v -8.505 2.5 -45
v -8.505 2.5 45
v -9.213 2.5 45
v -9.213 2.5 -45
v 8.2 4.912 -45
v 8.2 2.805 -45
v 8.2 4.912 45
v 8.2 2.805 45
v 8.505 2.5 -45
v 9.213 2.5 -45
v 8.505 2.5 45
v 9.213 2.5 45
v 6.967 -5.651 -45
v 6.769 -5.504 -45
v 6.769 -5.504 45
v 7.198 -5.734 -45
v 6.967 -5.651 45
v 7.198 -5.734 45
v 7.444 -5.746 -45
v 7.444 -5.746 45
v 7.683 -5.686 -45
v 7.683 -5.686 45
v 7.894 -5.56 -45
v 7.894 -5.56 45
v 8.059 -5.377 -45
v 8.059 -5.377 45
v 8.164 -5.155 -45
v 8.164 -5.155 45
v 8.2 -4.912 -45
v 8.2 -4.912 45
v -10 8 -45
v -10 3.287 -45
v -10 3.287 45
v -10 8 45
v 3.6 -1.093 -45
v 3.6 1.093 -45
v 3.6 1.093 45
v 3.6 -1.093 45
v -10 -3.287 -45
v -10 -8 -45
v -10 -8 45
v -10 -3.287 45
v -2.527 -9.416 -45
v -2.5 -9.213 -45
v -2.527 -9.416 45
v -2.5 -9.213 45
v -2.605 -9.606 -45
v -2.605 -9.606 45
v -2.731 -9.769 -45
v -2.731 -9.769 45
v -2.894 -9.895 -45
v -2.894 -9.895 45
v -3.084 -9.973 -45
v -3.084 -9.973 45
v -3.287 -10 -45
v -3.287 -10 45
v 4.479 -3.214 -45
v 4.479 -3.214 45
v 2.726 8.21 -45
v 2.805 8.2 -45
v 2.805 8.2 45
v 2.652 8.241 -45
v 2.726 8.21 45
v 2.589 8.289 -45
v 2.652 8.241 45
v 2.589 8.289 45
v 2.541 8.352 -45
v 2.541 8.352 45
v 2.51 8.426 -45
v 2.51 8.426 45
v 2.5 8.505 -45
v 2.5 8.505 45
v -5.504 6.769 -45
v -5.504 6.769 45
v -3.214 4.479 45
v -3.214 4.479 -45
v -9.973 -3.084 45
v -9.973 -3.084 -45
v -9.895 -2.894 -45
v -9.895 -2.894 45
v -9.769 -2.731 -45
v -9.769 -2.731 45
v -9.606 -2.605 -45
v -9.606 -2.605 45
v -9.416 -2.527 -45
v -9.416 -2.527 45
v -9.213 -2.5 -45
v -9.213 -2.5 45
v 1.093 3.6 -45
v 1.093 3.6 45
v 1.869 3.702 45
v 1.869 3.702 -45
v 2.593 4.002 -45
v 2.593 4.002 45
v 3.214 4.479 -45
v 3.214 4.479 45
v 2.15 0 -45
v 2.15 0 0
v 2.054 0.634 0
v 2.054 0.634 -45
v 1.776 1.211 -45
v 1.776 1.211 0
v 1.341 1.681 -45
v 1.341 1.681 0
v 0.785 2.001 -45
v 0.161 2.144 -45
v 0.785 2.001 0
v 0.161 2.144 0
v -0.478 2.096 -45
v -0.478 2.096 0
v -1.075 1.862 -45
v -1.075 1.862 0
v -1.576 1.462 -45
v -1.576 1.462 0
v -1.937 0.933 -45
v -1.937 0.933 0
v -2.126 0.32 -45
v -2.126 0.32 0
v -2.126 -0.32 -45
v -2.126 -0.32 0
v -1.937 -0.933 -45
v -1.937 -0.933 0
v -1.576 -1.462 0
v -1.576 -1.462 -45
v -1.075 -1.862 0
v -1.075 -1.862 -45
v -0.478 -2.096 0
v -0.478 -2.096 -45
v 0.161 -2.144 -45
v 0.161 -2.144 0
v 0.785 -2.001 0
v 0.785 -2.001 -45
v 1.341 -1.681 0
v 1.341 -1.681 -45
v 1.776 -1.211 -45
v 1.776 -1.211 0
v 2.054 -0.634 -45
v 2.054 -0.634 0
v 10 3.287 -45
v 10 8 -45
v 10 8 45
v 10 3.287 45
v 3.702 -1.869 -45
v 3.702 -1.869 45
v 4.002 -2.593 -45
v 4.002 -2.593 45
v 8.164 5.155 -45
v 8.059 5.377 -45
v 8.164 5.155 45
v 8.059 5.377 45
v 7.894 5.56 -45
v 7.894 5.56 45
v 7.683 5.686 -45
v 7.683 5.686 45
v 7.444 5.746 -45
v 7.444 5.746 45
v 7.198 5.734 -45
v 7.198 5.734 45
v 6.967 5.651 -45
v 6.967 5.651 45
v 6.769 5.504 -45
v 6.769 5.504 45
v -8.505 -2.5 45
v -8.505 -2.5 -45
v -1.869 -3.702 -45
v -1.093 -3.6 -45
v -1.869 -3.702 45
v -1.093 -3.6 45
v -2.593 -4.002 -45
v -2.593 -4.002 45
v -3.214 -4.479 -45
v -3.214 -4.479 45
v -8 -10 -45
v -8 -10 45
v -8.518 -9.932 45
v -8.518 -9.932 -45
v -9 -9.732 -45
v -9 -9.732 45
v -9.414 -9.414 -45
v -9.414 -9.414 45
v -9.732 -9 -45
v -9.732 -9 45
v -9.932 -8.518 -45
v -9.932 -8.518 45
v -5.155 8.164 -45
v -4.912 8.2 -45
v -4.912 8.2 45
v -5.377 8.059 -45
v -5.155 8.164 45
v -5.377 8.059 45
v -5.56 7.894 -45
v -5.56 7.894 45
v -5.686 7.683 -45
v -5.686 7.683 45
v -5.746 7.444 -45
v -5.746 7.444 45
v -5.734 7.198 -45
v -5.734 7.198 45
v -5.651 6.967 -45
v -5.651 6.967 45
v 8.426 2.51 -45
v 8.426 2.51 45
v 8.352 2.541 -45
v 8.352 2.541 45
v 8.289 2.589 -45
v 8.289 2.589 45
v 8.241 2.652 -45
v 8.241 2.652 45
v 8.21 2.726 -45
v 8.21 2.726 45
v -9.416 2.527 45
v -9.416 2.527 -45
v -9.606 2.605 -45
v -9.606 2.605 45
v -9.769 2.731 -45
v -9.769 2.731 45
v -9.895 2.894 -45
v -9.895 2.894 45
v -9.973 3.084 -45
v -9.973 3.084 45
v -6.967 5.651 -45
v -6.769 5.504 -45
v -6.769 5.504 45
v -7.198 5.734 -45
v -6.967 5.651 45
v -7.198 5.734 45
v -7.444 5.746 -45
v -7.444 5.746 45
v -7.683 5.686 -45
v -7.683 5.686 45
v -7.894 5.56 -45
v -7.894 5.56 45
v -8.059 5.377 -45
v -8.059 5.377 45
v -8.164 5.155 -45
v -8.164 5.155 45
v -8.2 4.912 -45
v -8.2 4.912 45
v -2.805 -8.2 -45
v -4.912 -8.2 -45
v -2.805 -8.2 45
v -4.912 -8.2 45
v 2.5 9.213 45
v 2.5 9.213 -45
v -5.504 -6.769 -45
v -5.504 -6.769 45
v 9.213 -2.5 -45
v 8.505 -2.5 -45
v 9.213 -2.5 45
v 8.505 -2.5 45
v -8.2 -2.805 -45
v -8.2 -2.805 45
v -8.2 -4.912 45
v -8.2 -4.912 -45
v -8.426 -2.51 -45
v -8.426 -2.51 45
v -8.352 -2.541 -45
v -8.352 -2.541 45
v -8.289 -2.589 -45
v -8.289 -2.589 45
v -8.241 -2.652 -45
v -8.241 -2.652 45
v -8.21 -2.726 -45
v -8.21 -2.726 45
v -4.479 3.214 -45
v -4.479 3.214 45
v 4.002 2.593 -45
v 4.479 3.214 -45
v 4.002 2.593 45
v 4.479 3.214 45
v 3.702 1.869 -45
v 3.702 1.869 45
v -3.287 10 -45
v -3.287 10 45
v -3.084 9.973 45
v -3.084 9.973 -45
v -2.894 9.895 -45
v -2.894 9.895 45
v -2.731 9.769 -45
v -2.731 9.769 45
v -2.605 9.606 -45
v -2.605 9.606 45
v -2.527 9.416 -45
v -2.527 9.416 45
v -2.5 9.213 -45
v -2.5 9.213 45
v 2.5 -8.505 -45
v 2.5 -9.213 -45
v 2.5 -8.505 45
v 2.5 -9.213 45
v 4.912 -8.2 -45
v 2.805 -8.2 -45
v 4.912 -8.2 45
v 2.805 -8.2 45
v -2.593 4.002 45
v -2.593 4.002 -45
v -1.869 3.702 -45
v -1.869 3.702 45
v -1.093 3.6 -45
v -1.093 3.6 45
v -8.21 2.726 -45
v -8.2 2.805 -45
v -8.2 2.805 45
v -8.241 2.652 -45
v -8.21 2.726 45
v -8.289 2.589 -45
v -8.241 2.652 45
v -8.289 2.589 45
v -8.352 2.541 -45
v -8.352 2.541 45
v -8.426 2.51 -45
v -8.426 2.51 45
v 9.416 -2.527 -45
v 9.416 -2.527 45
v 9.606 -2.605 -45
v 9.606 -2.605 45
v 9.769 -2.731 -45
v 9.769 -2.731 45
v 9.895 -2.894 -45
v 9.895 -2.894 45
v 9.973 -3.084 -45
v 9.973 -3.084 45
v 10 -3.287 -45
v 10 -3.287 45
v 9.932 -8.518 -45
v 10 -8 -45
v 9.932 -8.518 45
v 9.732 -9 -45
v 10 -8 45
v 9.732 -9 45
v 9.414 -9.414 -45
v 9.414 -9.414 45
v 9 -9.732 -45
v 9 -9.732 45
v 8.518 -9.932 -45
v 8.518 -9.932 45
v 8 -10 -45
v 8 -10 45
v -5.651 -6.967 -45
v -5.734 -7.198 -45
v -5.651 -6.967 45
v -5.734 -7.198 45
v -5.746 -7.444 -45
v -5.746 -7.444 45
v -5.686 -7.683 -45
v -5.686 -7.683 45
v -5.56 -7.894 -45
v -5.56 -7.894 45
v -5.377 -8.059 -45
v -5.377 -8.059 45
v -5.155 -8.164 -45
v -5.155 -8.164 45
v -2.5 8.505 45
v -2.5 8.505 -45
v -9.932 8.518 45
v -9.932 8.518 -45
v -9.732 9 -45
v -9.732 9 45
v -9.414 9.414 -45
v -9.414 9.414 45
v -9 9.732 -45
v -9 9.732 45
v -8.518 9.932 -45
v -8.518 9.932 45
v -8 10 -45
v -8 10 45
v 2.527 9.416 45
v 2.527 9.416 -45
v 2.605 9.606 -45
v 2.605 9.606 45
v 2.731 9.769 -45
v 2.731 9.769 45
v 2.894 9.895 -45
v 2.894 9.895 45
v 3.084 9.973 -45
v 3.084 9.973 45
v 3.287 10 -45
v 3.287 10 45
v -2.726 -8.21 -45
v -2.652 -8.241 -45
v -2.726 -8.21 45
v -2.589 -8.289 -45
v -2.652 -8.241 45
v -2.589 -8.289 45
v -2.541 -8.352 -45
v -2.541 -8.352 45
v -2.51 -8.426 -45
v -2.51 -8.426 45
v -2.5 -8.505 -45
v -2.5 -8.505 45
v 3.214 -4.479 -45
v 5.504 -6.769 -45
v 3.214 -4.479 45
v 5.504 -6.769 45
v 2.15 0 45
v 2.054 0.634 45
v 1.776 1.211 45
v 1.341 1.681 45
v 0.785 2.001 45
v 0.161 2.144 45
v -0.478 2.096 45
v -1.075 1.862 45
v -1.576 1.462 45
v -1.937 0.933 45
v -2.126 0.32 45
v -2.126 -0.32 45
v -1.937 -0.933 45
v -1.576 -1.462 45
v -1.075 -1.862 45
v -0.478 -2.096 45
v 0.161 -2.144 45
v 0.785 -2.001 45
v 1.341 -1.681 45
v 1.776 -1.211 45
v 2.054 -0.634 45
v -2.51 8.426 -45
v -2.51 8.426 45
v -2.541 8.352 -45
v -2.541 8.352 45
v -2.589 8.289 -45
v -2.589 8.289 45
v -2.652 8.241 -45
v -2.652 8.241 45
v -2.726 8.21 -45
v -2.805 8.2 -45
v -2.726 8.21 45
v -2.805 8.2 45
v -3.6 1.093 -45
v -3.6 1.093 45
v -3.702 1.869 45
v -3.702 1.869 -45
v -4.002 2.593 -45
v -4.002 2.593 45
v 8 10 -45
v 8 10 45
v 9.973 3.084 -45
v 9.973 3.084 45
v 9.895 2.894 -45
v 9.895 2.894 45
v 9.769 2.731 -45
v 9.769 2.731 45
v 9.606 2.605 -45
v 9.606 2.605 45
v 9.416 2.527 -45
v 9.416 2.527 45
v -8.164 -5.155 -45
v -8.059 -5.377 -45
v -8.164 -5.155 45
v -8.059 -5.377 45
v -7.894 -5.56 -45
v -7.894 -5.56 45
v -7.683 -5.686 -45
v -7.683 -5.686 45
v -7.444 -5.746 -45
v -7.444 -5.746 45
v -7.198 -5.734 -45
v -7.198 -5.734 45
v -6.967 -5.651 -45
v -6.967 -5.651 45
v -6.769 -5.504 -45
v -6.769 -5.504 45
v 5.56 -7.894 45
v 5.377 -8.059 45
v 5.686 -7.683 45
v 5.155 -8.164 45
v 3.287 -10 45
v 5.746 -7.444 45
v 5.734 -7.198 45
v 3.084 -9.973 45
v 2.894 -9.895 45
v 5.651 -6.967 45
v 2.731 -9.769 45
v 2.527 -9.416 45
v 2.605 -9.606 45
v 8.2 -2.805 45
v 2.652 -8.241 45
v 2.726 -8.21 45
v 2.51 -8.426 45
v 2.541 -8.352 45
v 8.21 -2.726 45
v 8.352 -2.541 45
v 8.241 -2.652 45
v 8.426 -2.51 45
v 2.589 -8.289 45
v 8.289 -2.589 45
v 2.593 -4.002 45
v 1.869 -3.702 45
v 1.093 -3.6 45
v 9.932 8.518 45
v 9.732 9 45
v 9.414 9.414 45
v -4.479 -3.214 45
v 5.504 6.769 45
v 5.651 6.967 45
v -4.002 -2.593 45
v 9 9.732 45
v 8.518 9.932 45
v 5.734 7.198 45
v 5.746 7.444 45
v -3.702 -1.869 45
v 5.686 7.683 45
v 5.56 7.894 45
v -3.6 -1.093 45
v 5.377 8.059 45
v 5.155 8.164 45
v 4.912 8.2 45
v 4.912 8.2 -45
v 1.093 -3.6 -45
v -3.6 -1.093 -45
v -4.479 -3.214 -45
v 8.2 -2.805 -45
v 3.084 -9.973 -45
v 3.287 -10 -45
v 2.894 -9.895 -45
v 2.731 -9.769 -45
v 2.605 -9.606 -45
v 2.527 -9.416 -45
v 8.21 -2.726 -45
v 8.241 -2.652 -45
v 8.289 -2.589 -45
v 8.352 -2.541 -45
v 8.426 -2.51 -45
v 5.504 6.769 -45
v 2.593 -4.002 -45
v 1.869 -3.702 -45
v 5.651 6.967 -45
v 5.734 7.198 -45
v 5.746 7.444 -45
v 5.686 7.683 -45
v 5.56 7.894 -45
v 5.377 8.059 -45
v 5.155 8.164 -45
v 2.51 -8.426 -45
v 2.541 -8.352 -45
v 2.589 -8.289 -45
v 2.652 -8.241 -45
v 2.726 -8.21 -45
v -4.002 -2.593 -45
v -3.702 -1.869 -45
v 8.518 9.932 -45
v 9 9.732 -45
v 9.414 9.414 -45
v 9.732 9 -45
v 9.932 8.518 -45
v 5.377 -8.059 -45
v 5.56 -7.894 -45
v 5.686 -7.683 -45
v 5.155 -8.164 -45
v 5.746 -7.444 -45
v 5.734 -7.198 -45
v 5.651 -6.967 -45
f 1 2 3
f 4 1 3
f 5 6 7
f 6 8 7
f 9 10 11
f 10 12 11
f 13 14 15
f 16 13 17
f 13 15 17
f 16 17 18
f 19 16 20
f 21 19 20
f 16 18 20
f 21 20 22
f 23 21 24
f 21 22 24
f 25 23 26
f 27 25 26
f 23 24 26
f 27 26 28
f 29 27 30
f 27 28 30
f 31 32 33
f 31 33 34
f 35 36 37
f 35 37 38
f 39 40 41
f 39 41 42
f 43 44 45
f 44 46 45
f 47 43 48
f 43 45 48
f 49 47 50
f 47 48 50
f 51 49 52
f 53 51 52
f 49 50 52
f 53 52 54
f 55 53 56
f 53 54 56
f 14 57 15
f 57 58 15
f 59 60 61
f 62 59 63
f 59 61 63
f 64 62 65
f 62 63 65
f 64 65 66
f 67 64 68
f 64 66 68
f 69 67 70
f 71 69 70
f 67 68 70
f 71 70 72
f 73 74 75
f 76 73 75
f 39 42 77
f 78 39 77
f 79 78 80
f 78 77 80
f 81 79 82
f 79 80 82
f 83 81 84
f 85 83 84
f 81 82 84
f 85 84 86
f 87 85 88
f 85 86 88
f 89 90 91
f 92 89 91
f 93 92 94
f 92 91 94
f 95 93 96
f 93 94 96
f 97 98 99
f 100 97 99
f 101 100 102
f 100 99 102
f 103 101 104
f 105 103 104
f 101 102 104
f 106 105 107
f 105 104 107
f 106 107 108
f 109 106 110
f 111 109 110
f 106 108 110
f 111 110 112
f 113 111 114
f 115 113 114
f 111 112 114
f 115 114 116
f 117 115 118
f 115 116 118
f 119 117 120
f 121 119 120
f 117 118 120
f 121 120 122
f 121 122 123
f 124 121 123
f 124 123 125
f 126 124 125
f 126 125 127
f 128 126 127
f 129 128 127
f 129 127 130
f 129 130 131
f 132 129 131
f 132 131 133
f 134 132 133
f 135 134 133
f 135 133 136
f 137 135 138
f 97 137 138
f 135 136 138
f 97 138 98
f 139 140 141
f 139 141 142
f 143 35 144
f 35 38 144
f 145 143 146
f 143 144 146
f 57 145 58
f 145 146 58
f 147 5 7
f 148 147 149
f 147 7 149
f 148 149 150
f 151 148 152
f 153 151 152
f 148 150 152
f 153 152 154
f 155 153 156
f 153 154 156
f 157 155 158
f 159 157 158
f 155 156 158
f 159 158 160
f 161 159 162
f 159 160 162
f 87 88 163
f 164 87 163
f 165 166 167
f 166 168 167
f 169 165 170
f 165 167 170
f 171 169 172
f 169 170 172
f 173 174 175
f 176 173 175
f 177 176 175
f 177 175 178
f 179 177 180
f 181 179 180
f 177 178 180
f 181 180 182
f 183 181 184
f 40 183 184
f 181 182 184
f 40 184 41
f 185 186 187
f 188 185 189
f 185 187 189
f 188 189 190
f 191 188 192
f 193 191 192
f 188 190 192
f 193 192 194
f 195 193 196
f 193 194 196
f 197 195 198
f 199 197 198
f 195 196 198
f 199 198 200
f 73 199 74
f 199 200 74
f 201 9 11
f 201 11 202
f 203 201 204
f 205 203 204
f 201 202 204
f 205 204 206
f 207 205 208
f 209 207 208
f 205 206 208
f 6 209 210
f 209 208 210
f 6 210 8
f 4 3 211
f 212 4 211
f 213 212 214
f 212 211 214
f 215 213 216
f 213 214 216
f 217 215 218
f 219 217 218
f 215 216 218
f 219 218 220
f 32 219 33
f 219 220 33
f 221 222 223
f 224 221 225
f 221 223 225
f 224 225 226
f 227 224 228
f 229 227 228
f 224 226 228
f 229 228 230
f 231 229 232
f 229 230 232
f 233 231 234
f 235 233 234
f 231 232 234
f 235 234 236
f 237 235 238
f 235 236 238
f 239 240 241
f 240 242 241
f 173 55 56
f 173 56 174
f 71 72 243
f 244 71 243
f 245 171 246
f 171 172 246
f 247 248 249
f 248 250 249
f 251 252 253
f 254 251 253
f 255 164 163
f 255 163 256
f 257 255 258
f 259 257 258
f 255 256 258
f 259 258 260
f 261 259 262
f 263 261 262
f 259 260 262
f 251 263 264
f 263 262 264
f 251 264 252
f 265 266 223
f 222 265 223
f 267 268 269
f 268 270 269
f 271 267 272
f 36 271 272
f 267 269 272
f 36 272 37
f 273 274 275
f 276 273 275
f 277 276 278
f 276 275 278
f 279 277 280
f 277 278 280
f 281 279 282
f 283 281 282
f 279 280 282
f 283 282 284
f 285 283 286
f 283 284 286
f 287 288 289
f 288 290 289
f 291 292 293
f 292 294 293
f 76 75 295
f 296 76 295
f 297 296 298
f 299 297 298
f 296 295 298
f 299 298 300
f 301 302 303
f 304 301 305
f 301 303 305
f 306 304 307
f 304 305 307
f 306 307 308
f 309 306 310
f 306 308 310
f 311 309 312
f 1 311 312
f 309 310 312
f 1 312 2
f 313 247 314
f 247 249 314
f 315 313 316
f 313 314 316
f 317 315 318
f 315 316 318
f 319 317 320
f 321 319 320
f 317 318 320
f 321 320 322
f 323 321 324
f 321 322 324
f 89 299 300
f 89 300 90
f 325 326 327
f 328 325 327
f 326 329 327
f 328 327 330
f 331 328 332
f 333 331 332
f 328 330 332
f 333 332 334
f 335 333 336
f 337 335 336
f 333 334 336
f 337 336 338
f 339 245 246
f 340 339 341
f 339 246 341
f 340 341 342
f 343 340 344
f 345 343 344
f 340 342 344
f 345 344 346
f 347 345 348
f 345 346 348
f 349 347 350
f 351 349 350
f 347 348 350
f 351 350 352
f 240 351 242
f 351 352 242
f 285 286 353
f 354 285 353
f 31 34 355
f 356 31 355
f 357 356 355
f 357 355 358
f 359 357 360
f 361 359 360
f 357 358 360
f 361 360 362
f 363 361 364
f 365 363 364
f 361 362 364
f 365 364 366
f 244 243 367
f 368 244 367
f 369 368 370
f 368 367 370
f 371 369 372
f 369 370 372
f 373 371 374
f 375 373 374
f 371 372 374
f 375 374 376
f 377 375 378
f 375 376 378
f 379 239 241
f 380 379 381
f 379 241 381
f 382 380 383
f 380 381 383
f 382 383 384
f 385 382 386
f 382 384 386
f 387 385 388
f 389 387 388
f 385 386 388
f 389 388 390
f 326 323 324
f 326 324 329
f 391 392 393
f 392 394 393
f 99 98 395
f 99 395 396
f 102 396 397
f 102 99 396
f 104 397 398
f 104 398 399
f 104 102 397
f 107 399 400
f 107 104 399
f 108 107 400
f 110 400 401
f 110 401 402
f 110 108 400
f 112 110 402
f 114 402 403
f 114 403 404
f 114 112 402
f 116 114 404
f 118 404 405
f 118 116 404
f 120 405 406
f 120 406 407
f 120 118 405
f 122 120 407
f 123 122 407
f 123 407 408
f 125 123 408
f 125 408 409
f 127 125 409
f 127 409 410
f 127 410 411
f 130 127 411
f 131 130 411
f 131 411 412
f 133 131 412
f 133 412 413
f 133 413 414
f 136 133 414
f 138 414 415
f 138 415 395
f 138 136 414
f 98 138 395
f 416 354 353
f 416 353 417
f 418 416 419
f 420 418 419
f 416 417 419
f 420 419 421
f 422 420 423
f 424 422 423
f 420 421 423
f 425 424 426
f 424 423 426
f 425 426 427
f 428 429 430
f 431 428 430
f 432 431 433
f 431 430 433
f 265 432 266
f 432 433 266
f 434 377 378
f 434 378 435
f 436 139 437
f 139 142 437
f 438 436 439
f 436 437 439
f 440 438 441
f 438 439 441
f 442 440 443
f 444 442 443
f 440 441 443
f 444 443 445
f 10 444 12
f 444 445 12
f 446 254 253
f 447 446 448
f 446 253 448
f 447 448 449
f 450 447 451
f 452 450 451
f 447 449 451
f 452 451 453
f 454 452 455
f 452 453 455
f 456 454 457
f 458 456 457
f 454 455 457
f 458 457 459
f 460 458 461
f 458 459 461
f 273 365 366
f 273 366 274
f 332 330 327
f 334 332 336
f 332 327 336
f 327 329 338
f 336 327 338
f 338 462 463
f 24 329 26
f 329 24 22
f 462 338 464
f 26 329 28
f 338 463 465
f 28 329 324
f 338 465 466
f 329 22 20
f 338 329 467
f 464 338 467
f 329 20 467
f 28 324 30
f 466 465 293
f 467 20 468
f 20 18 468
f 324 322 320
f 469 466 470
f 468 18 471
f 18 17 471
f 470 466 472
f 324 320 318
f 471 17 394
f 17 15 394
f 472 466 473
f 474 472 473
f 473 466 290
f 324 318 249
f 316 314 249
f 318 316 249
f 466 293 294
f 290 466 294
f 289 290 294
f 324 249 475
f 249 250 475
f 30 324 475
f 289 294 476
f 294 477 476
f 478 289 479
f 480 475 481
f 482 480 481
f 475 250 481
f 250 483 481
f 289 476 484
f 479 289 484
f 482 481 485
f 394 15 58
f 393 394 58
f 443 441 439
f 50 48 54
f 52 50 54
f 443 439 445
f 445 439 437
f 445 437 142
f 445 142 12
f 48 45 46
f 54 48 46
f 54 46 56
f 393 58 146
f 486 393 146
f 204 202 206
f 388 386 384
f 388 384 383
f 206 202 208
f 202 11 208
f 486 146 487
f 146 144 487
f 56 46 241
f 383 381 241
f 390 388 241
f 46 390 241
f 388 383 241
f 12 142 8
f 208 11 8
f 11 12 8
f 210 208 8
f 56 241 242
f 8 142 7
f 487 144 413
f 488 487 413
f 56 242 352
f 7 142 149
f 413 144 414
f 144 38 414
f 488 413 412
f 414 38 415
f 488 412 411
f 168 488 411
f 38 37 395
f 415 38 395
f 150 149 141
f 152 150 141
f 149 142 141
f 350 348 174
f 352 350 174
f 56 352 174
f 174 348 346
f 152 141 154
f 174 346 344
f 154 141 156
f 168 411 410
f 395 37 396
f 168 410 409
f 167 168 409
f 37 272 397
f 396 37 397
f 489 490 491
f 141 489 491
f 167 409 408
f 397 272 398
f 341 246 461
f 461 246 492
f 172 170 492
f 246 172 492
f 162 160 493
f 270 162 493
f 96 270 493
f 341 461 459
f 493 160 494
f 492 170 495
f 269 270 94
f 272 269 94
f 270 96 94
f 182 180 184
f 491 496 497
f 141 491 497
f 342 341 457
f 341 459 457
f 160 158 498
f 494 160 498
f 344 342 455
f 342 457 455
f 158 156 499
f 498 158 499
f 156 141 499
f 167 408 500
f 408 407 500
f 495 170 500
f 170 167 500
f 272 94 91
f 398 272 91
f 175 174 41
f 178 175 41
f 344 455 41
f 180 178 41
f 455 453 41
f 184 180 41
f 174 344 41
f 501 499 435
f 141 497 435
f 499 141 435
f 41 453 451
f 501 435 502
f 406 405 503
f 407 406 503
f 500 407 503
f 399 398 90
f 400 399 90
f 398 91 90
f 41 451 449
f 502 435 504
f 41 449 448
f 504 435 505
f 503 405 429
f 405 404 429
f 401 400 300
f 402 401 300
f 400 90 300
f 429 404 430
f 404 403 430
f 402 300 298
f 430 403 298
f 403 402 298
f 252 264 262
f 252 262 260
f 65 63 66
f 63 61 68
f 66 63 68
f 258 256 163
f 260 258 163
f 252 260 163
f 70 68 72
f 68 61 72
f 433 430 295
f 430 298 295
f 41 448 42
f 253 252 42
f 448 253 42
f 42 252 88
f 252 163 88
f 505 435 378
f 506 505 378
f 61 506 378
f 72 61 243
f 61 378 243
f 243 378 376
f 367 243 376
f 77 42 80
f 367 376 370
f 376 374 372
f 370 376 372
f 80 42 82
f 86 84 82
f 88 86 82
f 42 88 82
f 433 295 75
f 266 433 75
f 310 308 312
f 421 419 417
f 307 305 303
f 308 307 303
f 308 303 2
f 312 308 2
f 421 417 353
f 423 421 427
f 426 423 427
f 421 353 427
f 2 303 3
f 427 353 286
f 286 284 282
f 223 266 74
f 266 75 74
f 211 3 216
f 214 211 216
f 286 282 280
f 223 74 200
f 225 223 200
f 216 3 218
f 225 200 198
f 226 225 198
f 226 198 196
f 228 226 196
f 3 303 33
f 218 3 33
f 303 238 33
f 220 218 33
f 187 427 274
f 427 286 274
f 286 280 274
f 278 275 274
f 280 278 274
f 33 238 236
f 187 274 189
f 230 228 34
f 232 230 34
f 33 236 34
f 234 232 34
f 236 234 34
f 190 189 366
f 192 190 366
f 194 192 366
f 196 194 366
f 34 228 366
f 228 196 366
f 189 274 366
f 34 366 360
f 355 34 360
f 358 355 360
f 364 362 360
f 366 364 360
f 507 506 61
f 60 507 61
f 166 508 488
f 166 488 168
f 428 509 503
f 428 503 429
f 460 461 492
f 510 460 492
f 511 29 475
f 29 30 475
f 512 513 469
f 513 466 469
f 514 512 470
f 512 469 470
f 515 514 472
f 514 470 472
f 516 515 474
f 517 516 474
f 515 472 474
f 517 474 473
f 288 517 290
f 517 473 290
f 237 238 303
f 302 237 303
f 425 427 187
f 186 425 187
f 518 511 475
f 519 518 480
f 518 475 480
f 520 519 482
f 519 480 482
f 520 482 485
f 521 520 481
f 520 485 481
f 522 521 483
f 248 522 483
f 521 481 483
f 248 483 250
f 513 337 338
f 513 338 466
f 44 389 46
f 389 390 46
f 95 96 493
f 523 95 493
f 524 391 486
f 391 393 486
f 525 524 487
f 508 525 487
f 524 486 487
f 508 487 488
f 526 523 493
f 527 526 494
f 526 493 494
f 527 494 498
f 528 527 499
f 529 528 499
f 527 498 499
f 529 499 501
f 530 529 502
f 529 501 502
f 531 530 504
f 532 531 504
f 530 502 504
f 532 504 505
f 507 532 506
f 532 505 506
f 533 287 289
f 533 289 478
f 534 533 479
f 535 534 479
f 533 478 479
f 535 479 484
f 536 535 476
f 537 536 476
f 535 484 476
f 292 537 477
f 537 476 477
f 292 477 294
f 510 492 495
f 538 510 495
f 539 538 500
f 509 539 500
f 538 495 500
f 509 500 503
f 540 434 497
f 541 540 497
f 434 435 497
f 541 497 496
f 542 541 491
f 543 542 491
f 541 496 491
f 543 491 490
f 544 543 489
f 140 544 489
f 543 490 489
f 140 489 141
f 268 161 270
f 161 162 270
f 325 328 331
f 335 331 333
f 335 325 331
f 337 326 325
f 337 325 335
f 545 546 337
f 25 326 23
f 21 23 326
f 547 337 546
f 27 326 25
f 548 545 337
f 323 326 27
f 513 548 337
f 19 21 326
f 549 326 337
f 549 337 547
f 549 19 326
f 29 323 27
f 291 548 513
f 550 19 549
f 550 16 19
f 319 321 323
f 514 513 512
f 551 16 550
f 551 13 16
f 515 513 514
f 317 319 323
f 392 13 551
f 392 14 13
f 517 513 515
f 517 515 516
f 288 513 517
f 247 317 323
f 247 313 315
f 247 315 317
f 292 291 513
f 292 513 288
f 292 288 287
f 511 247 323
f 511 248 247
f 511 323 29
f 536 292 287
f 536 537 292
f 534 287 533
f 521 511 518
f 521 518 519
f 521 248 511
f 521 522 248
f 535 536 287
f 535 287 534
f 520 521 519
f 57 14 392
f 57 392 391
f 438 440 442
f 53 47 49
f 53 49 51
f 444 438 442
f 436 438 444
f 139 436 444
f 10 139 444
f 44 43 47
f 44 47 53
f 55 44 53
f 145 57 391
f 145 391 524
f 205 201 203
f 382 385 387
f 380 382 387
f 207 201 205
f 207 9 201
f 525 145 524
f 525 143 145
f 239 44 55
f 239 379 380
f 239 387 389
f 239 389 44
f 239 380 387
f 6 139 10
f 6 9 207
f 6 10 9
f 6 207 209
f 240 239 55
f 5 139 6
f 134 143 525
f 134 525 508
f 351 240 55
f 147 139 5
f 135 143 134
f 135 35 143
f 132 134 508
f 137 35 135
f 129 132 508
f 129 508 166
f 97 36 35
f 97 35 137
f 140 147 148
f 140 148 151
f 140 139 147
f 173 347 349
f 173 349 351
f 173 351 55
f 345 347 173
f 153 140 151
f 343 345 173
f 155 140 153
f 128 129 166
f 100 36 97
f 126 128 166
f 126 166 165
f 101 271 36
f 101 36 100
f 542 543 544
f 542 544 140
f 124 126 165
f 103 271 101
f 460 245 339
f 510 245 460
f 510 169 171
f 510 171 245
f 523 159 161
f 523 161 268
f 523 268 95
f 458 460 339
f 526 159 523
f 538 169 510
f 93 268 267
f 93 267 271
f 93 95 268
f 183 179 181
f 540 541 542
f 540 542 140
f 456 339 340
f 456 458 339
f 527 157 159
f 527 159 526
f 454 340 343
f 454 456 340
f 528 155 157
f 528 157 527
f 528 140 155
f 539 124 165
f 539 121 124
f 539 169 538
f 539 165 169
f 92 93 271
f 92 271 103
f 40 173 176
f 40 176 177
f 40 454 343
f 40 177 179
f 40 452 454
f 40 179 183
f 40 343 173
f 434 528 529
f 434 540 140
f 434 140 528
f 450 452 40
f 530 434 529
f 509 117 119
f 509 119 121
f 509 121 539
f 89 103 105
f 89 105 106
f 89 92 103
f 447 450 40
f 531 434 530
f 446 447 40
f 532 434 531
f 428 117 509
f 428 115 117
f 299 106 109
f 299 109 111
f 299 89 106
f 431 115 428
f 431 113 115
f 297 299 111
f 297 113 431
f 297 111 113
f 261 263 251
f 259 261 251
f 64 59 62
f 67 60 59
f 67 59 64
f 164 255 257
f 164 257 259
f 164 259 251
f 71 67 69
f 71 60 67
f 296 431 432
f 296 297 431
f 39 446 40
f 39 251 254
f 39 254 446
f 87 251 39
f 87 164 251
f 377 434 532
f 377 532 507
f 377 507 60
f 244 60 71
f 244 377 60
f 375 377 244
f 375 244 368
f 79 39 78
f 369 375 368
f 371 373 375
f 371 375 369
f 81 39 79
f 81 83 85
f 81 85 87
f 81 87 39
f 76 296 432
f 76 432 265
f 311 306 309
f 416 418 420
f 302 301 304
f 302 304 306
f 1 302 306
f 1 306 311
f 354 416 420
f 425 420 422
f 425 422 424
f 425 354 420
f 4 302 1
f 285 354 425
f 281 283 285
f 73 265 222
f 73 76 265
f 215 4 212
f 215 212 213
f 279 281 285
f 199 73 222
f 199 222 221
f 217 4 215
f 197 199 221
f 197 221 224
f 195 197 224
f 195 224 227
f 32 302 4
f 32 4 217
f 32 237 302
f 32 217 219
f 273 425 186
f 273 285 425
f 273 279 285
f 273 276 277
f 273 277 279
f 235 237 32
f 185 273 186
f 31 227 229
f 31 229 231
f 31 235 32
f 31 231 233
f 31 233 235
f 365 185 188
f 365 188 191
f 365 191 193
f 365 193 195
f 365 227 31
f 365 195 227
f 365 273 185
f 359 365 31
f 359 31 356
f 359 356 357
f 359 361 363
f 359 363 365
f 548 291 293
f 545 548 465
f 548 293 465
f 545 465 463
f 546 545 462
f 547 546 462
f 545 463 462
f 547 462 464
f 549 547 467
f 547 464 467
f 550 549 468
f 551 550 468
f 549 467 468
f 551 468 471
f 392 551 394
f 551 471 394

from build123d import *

# Parameters (mm, degrees)
SKETCH3_R                = 2.15
BOSS_EXTRUDE1_DEPTH      = 45
BOSS_EXTRUDE1_DEPTH_BACK = 45


with BuildPart() as part:
    # Sketch3 → Boss-Extrude1 (new body, two sides)
    with BuildSketch(Plane.XY) as boss_extrude1_sk:
        with BuildLine():
            Line((3.2874, 10), (8, 10))
            ThreePointArc((8, 10), (9.414213562, 9.414213562), (10, 8))
            Line((10, 8), (10, 3.2874))
            ThreePointArc((10, 3.2874), (9.76937588, 2.73062412), (9.2126, 2.5))
            Line((9.2126, 2.5), (8.5048, 2.5))
            ThreePointArc((8.5048, 2.5), (8.289273853, 2.589273853), (8.2, 2.8048))
            Line((8.2, 2.8048), (8.2, 4.9118))
            ThreePointArc((8.2, 4.9118), (7.682565253, 5.686195824), (6.769103096, 5.504496904))
            Line((6.769103096, 5.504496904), (4.478679656, 3.214073464))
            ThreePointArc((4.478679656, 3.214073464), (3.828361402, 2.240803418), (3.6, 1.092753121))
            Line((3.6, 1.092753121), (3.6, -1.092753121))
            ThreePointArc((3.6, -1.092753121), (3.828361402, -2.240803418), (4.478679656, -3.214073464))
            Line((4.478679656, -3.214073464), (6.769103096, -5.504496904))
            ThreePointArc((6.769103096, -5.504496904), (7.682565253, -5.686195824), (8.2, -4.9118))
            Line((8.2, -4.9118), (8.2, -2.8048))
            ThreePointArc((8.2, -2.8048), (8.289273853, -2.589273853), (8.5048, -2.5))
            Line((8.5048, -2.5), (9.2126, -2.5))
            ThreePointArc((9.2126, -2.5), (9.76937588, -2.73062412), (10, -3.2874))
            Line((10, -3.2874), (10, -8))
            ThreePointArc((10, -8), (9.414213562, -9.414213562), (8, -10))
            Line((8, -10), (3.2874, -10))
            ThreePointArc((3.2874, -10), (2.73062412, -9.76937588), (2.5, -9.2126))
            Line((2.5, -9.2126), (2.5, -8.5048))
            ThreePointArc((2.5, -8.5048), (2.589273853, -8.289273853), (2.8048, -8.2))
            Line((2.8048, -8.2), (4.9118, -8.2))
            ThreePointArc((4.9118, -8.2), (5.686195824, -7.682565253), (5.504496904, -6.769103096))
            Line((5.504496904, -6.769103096), (3.214073464, -4.478679656))
            ThreePointArc((3.214073464, -4.478679656), (2.240803418, -3.828361402), (1.092753121, -3.6))
            Line((1.092753121, -3.6), (-1.092753121, -3.6))
            ThreePointArc((-1.092753121, -3.6), (-2.240803418, -3.828361402), (-3.214073464, -4.478679656))
            Line((-3.214073464, -4.478679656), (-5.504496904, -6.769103096))
            ThreePointArc((-5.504496904, -6.769103096), (-5.686195824, -7.682565253), (-4.9118, -8.2))
            Line((-4.9118, -8.2), (-2.8048, -8.2))
            ThreePointArc((-2.8048, -8.2), (-2.589273853, -8.289273853), (-2.5, -8.5048))
            Line((-2.5, -8.5048), (-2.5, -9.2126))
            ThreePointArc((-2.5, -9.2126), (-2.73062412, -9.76937588), (-3.2874, -10))
            Line((-3.2874, -10), (-8, -10))
            ThreePointArc((-8, -10), (-9.414213562, -9.414213562), (-10, -8))
            Line((-10, -8), (-10, -3.2874))
            ThreePointArc((-10, -3.2874), (-9.76937588, -2.73062412), (-9.2126, -2.5))
            Line((-9.2126, -2.5), (-8.5048, -2.5))
            ThreePointArc((-8.5048, -2.5), (-8.289273853, -2.589273853), (-8.2, -2.8048))
            Line((-8.2, -2.8048), (-8.2, -4.9118))
            ThreePointArc((-8.2, -4.9118), (-7.682565253, -5.686195824), (-6.769103096, -5.504496904))
            Line((-6.769103096, -5.504496904), (-4.478679656, -3.214073464))
            ThreePointArc((-4.478679656, -3.214073464), (-3.828361402, -2.240803418), (-3.6, -1.092753121))
            Line((-3.6, -1.092753121), (-3.6, 1.092753121))
            ThreePointArc((-3.6, 1.092753121), (-3.828361402, 2.240803418), (-4.478679656, 3.214073464))
            Line((-4.478679656, 3.214073464), (-6.769103096, 5.504496904))
            ThreePointArc((-6.769103096, 5.504496904), (-7.682565253, 5.686195824), (-8.2, 4.9118))
            Line((-8.2, 4.9118), (-8.2, 2.8048))
            ThreePointArc((-8.2, 2.8048), (-8.289273853, 2.589273853), (-8.5048, 2.5))
            Line((-8.5048, 2.5), (-9.2126, 2.5))
            ThreePointArc((-9.2126, 2.5), (-9.76937588, 2.73062412), (-10, 3.2874))
            Line((-10, 3.2874), (-10, 8))
            ThreePointArc((-10, 8), (-9.414213562, 9.414213562), (-8, 10))
            Line((-8, 10), (-3.2874, 10))
            ThreePointArc((-3.2874, 10), (-2.73062412, 9.76937588), (-2.5, 9.2126))
            Line((-2.5, 9.2126), (-2.5, 8.5048))
            ThreePointArc((-2.5, 8.5048), (-2.589273853, 8.289273853), (-2.8048, 8.2))
            Line((-2.8048, 8.2), (-4.9118, 8.2))
            ThreePointArc((-4.9118, 8.2), (-5.686195824, 7.682565253), (-5.504496904, 6.769103096))
            Line((-5.504496904, 6.769103096), (-3.214073464, 4.478679656))
            ThreePointArc((-3.214073464, 4.478679656), (-2.240803418, 3.828361402), (-1.092753121, 3.6))
            Line((-1.092753121, 3.6), (1.092753121, 3.6))
            ThreePointArc((1.092753121, 3.6), (2.240803418, 3.828361402), (3.214073464, 4.478679656))
            Line((3.214073464, 4.478679656), (5.504496904, 6.769103096))
            ThreePointArc((5.504496904, 6.769103096), (5.686195824, 7.682565253), (4.9118, 8.2))
            Line((4.9118, 8.2), (2.8048, 8.2))
            ThreePointArc((2.8048, 8.2), (2.589273853, 8.289273853), (2.5, 8.5048))
            Line((2.5, 8.5048), (2.5, 9.2126))
            ThreePointArc((2.5, 9.2126), (2.73062412, 9.76937588), (3.2874, 10))
        make_face()
        Circle(SKETCH3_R, mode=Mode.SUBTRACT)
    extrude(amount=BOSS_EXTRUDE1_DEPTH)
    extrude(boss_extrude1_sk.sketch, amount=-BOSS_EXTRUDE1_DEPTH_BACK)


solid = part.part
